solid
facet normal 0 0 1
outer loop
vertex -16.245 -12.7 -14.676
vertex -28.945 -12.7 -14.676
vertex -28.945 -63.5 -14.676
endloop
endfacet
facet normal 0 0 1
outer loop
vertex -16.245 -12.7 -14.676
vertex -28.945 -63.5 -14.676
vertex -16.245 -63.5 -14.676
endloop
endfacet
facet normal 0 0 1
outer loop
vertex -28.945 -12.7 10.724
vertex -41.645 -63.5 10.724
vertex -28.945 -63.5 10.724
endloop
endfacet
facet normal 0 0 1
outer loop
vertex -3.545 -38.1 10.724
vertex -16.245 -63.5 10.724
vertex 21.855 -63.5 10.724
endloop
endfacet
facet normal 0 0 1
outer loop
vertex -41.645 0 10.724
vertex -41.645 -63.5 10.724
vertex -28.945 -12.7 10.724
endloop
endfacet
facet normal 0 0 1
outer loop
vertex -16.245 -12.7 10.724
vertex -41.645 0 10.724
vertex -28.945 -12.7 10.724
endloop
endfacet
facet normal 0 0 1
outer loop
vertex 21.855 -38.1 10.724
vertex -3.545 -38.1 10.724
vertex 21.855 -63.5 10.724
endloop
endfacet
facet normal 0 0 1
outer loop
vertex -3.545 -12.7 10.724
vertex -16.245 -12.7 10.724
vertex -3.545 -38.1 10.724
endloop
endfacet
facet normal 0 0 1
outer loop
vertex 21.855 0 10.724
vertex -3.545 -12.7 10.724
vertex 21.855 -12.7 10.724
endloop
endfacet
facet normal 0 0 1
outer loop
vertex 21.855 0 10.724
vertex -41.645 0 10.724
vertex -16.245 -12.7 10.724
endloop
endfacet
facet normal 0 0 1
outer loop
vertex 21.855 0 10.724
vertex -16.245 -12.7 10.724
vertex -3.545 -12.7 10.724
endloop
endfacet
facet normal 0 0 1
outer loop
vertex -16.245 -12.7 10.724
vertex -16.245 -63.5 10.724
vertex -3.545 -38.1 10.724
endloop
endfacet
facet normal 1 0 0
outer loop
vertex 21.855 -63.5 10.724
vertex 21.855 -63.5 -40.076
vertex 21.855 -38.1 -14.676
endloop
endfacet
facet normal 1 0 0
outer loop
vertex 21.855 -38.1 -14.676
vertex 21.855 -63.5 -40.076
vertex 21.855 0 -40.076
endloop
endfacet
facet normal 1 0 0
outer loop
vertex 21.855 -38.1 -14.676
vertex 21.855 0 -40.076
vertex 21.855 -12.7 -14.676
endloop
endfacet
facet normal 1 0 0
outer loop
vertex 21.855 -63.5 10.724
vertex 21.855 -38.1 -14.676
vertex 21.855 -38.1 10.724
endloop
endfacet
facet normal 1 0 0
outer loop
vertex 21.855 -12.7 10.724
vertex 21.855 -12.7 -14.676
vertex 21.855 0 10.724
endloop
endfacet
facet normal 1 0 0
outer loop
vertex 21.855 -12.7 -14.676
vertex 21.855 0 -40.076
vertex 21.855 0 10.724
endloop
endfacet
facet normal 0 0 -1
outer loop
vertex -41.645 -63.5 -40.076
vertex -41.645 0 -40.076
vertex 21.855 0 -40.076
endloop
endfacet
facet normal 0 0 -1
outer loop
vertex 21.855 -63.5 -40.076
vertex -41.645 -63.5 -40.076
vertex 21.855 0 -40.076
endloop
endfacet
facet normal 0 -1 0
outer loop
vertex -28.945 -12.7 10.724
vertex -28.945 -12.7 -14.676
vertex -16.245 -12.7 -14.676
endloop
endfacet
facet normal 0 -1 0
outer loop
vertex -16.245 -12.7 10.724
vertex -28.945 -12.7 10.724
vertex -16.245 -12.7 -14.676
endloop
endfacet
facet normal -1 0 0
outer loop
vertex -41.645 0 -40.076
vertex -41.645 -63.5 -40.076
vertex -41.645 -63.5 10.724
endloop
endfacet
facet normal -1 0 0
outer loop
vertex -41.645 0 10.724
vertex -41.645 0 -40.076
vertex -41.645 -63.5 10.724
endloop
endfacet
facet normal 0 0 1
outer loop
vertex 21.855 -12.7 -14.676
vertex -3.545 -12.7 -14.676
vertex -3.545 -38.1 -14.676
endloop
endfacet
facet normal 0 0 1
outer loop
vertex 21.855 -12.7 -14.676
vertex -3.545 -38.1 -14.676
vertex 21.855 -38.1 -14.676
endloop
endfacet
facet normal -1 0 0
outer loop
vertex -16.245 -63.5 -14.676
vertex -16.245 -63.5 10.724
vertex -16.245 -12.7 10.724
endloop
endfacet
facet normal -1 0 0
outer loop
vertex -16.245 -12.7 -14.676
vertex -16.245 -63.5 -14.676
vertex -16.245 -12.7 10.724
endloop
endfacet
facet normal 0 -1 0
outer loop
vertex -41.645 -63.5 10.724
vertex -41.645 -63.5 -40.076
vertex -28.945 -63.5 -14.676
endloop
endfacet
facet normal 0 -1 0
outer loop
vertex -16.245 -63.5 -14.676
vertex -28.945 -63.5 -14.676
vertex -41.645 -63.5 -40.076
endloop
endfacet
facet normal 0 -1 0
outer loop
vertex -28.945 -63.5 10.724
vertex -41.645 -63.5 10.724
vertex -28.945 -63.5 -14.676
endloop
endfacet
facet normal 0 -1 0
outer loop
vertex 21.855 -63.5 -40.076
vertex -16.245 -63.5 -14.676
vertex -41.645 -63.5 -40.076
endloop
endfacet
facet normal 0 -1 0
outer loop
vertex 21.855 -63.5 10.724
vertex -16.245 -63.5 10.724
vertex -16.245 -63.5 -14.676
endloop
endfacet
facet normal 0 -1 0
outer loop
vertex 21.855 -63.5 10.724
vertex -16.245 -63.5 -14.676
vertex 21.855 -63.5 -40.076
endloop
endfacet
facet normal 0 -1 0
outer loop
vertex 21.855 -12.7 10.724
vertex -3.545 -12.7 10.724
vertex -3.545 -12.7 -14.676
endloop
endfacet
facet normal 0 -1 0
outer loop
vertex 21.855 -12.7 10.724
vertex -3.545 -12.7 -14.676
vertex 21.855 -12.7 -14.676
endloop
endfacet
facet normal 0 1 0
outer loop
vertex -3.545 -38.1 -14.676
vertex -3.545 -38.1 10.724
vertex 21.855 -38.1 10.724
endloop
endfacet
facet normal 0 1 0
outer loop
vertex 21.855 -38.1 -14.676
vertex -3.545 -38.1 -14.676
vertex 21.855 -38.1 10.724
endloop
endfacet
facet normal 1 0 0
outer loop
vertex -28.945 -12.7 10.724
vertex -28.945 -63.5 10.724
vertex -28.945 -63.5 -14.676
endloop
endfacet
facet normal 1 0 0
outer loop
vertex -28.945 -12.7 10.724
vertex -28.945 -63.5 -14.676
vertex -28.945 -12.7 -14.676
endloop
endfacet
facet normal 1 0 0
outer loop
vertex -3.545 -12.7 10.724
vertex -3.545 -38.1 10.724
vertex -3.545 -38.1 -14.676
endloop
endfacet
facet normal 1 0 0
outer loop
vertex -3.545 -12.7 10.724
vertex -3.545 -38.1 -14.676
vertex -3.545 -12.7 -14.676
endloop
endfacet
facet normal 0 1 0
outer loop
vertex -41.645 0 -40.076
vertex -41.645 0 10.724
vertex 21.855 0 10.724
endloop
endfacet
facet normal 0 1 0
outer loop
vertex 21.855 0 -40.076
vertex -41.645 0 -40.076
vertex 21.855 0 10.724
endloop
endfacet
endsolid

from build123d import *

# Parameters (mm, degrees)
F0_W     = 63.5
F0_H     = 50.8
F1_DEPTH = 63.5
F2_W     = 12.7
F2_H     = 50.8
F3_DEPTH = 25.4
F2_W_2   = 25.4
F2_H_2   = 25.4
F4_DEPTH = 25.4


with BuildPart() as f1:
    # F0 (on Front) → F1 (new body)
    with BuildSketch(Plane.XZ):
        with Locations((-9.895136, -14.676312)):
            Rectangle(F0_W, F0_H)
    extrude(amount=F1_DEPTH)

    # F2 (on face) → F3 (cut)
    with BuildSketch(Plane.XY.offset(10.723688)):
        with Locations((-22.595136, -38.1)):
            Rectangle(F2_W, F2_H)
    extrude(amount=-F3_DEPTH, mode=Mode.SUBTRACT)

    # F2 (on face) → F4 (cut)
    with BuildSketch(Plane.XY.offset(10.723688)):
        with Locations((9.154864, -25.4)):
            Rectangle(F2_W_2, F2_H_2)
    extrude(amount=-F4_DEPTH, mode=Mode.SUBTRACT)


solid = f1.part
